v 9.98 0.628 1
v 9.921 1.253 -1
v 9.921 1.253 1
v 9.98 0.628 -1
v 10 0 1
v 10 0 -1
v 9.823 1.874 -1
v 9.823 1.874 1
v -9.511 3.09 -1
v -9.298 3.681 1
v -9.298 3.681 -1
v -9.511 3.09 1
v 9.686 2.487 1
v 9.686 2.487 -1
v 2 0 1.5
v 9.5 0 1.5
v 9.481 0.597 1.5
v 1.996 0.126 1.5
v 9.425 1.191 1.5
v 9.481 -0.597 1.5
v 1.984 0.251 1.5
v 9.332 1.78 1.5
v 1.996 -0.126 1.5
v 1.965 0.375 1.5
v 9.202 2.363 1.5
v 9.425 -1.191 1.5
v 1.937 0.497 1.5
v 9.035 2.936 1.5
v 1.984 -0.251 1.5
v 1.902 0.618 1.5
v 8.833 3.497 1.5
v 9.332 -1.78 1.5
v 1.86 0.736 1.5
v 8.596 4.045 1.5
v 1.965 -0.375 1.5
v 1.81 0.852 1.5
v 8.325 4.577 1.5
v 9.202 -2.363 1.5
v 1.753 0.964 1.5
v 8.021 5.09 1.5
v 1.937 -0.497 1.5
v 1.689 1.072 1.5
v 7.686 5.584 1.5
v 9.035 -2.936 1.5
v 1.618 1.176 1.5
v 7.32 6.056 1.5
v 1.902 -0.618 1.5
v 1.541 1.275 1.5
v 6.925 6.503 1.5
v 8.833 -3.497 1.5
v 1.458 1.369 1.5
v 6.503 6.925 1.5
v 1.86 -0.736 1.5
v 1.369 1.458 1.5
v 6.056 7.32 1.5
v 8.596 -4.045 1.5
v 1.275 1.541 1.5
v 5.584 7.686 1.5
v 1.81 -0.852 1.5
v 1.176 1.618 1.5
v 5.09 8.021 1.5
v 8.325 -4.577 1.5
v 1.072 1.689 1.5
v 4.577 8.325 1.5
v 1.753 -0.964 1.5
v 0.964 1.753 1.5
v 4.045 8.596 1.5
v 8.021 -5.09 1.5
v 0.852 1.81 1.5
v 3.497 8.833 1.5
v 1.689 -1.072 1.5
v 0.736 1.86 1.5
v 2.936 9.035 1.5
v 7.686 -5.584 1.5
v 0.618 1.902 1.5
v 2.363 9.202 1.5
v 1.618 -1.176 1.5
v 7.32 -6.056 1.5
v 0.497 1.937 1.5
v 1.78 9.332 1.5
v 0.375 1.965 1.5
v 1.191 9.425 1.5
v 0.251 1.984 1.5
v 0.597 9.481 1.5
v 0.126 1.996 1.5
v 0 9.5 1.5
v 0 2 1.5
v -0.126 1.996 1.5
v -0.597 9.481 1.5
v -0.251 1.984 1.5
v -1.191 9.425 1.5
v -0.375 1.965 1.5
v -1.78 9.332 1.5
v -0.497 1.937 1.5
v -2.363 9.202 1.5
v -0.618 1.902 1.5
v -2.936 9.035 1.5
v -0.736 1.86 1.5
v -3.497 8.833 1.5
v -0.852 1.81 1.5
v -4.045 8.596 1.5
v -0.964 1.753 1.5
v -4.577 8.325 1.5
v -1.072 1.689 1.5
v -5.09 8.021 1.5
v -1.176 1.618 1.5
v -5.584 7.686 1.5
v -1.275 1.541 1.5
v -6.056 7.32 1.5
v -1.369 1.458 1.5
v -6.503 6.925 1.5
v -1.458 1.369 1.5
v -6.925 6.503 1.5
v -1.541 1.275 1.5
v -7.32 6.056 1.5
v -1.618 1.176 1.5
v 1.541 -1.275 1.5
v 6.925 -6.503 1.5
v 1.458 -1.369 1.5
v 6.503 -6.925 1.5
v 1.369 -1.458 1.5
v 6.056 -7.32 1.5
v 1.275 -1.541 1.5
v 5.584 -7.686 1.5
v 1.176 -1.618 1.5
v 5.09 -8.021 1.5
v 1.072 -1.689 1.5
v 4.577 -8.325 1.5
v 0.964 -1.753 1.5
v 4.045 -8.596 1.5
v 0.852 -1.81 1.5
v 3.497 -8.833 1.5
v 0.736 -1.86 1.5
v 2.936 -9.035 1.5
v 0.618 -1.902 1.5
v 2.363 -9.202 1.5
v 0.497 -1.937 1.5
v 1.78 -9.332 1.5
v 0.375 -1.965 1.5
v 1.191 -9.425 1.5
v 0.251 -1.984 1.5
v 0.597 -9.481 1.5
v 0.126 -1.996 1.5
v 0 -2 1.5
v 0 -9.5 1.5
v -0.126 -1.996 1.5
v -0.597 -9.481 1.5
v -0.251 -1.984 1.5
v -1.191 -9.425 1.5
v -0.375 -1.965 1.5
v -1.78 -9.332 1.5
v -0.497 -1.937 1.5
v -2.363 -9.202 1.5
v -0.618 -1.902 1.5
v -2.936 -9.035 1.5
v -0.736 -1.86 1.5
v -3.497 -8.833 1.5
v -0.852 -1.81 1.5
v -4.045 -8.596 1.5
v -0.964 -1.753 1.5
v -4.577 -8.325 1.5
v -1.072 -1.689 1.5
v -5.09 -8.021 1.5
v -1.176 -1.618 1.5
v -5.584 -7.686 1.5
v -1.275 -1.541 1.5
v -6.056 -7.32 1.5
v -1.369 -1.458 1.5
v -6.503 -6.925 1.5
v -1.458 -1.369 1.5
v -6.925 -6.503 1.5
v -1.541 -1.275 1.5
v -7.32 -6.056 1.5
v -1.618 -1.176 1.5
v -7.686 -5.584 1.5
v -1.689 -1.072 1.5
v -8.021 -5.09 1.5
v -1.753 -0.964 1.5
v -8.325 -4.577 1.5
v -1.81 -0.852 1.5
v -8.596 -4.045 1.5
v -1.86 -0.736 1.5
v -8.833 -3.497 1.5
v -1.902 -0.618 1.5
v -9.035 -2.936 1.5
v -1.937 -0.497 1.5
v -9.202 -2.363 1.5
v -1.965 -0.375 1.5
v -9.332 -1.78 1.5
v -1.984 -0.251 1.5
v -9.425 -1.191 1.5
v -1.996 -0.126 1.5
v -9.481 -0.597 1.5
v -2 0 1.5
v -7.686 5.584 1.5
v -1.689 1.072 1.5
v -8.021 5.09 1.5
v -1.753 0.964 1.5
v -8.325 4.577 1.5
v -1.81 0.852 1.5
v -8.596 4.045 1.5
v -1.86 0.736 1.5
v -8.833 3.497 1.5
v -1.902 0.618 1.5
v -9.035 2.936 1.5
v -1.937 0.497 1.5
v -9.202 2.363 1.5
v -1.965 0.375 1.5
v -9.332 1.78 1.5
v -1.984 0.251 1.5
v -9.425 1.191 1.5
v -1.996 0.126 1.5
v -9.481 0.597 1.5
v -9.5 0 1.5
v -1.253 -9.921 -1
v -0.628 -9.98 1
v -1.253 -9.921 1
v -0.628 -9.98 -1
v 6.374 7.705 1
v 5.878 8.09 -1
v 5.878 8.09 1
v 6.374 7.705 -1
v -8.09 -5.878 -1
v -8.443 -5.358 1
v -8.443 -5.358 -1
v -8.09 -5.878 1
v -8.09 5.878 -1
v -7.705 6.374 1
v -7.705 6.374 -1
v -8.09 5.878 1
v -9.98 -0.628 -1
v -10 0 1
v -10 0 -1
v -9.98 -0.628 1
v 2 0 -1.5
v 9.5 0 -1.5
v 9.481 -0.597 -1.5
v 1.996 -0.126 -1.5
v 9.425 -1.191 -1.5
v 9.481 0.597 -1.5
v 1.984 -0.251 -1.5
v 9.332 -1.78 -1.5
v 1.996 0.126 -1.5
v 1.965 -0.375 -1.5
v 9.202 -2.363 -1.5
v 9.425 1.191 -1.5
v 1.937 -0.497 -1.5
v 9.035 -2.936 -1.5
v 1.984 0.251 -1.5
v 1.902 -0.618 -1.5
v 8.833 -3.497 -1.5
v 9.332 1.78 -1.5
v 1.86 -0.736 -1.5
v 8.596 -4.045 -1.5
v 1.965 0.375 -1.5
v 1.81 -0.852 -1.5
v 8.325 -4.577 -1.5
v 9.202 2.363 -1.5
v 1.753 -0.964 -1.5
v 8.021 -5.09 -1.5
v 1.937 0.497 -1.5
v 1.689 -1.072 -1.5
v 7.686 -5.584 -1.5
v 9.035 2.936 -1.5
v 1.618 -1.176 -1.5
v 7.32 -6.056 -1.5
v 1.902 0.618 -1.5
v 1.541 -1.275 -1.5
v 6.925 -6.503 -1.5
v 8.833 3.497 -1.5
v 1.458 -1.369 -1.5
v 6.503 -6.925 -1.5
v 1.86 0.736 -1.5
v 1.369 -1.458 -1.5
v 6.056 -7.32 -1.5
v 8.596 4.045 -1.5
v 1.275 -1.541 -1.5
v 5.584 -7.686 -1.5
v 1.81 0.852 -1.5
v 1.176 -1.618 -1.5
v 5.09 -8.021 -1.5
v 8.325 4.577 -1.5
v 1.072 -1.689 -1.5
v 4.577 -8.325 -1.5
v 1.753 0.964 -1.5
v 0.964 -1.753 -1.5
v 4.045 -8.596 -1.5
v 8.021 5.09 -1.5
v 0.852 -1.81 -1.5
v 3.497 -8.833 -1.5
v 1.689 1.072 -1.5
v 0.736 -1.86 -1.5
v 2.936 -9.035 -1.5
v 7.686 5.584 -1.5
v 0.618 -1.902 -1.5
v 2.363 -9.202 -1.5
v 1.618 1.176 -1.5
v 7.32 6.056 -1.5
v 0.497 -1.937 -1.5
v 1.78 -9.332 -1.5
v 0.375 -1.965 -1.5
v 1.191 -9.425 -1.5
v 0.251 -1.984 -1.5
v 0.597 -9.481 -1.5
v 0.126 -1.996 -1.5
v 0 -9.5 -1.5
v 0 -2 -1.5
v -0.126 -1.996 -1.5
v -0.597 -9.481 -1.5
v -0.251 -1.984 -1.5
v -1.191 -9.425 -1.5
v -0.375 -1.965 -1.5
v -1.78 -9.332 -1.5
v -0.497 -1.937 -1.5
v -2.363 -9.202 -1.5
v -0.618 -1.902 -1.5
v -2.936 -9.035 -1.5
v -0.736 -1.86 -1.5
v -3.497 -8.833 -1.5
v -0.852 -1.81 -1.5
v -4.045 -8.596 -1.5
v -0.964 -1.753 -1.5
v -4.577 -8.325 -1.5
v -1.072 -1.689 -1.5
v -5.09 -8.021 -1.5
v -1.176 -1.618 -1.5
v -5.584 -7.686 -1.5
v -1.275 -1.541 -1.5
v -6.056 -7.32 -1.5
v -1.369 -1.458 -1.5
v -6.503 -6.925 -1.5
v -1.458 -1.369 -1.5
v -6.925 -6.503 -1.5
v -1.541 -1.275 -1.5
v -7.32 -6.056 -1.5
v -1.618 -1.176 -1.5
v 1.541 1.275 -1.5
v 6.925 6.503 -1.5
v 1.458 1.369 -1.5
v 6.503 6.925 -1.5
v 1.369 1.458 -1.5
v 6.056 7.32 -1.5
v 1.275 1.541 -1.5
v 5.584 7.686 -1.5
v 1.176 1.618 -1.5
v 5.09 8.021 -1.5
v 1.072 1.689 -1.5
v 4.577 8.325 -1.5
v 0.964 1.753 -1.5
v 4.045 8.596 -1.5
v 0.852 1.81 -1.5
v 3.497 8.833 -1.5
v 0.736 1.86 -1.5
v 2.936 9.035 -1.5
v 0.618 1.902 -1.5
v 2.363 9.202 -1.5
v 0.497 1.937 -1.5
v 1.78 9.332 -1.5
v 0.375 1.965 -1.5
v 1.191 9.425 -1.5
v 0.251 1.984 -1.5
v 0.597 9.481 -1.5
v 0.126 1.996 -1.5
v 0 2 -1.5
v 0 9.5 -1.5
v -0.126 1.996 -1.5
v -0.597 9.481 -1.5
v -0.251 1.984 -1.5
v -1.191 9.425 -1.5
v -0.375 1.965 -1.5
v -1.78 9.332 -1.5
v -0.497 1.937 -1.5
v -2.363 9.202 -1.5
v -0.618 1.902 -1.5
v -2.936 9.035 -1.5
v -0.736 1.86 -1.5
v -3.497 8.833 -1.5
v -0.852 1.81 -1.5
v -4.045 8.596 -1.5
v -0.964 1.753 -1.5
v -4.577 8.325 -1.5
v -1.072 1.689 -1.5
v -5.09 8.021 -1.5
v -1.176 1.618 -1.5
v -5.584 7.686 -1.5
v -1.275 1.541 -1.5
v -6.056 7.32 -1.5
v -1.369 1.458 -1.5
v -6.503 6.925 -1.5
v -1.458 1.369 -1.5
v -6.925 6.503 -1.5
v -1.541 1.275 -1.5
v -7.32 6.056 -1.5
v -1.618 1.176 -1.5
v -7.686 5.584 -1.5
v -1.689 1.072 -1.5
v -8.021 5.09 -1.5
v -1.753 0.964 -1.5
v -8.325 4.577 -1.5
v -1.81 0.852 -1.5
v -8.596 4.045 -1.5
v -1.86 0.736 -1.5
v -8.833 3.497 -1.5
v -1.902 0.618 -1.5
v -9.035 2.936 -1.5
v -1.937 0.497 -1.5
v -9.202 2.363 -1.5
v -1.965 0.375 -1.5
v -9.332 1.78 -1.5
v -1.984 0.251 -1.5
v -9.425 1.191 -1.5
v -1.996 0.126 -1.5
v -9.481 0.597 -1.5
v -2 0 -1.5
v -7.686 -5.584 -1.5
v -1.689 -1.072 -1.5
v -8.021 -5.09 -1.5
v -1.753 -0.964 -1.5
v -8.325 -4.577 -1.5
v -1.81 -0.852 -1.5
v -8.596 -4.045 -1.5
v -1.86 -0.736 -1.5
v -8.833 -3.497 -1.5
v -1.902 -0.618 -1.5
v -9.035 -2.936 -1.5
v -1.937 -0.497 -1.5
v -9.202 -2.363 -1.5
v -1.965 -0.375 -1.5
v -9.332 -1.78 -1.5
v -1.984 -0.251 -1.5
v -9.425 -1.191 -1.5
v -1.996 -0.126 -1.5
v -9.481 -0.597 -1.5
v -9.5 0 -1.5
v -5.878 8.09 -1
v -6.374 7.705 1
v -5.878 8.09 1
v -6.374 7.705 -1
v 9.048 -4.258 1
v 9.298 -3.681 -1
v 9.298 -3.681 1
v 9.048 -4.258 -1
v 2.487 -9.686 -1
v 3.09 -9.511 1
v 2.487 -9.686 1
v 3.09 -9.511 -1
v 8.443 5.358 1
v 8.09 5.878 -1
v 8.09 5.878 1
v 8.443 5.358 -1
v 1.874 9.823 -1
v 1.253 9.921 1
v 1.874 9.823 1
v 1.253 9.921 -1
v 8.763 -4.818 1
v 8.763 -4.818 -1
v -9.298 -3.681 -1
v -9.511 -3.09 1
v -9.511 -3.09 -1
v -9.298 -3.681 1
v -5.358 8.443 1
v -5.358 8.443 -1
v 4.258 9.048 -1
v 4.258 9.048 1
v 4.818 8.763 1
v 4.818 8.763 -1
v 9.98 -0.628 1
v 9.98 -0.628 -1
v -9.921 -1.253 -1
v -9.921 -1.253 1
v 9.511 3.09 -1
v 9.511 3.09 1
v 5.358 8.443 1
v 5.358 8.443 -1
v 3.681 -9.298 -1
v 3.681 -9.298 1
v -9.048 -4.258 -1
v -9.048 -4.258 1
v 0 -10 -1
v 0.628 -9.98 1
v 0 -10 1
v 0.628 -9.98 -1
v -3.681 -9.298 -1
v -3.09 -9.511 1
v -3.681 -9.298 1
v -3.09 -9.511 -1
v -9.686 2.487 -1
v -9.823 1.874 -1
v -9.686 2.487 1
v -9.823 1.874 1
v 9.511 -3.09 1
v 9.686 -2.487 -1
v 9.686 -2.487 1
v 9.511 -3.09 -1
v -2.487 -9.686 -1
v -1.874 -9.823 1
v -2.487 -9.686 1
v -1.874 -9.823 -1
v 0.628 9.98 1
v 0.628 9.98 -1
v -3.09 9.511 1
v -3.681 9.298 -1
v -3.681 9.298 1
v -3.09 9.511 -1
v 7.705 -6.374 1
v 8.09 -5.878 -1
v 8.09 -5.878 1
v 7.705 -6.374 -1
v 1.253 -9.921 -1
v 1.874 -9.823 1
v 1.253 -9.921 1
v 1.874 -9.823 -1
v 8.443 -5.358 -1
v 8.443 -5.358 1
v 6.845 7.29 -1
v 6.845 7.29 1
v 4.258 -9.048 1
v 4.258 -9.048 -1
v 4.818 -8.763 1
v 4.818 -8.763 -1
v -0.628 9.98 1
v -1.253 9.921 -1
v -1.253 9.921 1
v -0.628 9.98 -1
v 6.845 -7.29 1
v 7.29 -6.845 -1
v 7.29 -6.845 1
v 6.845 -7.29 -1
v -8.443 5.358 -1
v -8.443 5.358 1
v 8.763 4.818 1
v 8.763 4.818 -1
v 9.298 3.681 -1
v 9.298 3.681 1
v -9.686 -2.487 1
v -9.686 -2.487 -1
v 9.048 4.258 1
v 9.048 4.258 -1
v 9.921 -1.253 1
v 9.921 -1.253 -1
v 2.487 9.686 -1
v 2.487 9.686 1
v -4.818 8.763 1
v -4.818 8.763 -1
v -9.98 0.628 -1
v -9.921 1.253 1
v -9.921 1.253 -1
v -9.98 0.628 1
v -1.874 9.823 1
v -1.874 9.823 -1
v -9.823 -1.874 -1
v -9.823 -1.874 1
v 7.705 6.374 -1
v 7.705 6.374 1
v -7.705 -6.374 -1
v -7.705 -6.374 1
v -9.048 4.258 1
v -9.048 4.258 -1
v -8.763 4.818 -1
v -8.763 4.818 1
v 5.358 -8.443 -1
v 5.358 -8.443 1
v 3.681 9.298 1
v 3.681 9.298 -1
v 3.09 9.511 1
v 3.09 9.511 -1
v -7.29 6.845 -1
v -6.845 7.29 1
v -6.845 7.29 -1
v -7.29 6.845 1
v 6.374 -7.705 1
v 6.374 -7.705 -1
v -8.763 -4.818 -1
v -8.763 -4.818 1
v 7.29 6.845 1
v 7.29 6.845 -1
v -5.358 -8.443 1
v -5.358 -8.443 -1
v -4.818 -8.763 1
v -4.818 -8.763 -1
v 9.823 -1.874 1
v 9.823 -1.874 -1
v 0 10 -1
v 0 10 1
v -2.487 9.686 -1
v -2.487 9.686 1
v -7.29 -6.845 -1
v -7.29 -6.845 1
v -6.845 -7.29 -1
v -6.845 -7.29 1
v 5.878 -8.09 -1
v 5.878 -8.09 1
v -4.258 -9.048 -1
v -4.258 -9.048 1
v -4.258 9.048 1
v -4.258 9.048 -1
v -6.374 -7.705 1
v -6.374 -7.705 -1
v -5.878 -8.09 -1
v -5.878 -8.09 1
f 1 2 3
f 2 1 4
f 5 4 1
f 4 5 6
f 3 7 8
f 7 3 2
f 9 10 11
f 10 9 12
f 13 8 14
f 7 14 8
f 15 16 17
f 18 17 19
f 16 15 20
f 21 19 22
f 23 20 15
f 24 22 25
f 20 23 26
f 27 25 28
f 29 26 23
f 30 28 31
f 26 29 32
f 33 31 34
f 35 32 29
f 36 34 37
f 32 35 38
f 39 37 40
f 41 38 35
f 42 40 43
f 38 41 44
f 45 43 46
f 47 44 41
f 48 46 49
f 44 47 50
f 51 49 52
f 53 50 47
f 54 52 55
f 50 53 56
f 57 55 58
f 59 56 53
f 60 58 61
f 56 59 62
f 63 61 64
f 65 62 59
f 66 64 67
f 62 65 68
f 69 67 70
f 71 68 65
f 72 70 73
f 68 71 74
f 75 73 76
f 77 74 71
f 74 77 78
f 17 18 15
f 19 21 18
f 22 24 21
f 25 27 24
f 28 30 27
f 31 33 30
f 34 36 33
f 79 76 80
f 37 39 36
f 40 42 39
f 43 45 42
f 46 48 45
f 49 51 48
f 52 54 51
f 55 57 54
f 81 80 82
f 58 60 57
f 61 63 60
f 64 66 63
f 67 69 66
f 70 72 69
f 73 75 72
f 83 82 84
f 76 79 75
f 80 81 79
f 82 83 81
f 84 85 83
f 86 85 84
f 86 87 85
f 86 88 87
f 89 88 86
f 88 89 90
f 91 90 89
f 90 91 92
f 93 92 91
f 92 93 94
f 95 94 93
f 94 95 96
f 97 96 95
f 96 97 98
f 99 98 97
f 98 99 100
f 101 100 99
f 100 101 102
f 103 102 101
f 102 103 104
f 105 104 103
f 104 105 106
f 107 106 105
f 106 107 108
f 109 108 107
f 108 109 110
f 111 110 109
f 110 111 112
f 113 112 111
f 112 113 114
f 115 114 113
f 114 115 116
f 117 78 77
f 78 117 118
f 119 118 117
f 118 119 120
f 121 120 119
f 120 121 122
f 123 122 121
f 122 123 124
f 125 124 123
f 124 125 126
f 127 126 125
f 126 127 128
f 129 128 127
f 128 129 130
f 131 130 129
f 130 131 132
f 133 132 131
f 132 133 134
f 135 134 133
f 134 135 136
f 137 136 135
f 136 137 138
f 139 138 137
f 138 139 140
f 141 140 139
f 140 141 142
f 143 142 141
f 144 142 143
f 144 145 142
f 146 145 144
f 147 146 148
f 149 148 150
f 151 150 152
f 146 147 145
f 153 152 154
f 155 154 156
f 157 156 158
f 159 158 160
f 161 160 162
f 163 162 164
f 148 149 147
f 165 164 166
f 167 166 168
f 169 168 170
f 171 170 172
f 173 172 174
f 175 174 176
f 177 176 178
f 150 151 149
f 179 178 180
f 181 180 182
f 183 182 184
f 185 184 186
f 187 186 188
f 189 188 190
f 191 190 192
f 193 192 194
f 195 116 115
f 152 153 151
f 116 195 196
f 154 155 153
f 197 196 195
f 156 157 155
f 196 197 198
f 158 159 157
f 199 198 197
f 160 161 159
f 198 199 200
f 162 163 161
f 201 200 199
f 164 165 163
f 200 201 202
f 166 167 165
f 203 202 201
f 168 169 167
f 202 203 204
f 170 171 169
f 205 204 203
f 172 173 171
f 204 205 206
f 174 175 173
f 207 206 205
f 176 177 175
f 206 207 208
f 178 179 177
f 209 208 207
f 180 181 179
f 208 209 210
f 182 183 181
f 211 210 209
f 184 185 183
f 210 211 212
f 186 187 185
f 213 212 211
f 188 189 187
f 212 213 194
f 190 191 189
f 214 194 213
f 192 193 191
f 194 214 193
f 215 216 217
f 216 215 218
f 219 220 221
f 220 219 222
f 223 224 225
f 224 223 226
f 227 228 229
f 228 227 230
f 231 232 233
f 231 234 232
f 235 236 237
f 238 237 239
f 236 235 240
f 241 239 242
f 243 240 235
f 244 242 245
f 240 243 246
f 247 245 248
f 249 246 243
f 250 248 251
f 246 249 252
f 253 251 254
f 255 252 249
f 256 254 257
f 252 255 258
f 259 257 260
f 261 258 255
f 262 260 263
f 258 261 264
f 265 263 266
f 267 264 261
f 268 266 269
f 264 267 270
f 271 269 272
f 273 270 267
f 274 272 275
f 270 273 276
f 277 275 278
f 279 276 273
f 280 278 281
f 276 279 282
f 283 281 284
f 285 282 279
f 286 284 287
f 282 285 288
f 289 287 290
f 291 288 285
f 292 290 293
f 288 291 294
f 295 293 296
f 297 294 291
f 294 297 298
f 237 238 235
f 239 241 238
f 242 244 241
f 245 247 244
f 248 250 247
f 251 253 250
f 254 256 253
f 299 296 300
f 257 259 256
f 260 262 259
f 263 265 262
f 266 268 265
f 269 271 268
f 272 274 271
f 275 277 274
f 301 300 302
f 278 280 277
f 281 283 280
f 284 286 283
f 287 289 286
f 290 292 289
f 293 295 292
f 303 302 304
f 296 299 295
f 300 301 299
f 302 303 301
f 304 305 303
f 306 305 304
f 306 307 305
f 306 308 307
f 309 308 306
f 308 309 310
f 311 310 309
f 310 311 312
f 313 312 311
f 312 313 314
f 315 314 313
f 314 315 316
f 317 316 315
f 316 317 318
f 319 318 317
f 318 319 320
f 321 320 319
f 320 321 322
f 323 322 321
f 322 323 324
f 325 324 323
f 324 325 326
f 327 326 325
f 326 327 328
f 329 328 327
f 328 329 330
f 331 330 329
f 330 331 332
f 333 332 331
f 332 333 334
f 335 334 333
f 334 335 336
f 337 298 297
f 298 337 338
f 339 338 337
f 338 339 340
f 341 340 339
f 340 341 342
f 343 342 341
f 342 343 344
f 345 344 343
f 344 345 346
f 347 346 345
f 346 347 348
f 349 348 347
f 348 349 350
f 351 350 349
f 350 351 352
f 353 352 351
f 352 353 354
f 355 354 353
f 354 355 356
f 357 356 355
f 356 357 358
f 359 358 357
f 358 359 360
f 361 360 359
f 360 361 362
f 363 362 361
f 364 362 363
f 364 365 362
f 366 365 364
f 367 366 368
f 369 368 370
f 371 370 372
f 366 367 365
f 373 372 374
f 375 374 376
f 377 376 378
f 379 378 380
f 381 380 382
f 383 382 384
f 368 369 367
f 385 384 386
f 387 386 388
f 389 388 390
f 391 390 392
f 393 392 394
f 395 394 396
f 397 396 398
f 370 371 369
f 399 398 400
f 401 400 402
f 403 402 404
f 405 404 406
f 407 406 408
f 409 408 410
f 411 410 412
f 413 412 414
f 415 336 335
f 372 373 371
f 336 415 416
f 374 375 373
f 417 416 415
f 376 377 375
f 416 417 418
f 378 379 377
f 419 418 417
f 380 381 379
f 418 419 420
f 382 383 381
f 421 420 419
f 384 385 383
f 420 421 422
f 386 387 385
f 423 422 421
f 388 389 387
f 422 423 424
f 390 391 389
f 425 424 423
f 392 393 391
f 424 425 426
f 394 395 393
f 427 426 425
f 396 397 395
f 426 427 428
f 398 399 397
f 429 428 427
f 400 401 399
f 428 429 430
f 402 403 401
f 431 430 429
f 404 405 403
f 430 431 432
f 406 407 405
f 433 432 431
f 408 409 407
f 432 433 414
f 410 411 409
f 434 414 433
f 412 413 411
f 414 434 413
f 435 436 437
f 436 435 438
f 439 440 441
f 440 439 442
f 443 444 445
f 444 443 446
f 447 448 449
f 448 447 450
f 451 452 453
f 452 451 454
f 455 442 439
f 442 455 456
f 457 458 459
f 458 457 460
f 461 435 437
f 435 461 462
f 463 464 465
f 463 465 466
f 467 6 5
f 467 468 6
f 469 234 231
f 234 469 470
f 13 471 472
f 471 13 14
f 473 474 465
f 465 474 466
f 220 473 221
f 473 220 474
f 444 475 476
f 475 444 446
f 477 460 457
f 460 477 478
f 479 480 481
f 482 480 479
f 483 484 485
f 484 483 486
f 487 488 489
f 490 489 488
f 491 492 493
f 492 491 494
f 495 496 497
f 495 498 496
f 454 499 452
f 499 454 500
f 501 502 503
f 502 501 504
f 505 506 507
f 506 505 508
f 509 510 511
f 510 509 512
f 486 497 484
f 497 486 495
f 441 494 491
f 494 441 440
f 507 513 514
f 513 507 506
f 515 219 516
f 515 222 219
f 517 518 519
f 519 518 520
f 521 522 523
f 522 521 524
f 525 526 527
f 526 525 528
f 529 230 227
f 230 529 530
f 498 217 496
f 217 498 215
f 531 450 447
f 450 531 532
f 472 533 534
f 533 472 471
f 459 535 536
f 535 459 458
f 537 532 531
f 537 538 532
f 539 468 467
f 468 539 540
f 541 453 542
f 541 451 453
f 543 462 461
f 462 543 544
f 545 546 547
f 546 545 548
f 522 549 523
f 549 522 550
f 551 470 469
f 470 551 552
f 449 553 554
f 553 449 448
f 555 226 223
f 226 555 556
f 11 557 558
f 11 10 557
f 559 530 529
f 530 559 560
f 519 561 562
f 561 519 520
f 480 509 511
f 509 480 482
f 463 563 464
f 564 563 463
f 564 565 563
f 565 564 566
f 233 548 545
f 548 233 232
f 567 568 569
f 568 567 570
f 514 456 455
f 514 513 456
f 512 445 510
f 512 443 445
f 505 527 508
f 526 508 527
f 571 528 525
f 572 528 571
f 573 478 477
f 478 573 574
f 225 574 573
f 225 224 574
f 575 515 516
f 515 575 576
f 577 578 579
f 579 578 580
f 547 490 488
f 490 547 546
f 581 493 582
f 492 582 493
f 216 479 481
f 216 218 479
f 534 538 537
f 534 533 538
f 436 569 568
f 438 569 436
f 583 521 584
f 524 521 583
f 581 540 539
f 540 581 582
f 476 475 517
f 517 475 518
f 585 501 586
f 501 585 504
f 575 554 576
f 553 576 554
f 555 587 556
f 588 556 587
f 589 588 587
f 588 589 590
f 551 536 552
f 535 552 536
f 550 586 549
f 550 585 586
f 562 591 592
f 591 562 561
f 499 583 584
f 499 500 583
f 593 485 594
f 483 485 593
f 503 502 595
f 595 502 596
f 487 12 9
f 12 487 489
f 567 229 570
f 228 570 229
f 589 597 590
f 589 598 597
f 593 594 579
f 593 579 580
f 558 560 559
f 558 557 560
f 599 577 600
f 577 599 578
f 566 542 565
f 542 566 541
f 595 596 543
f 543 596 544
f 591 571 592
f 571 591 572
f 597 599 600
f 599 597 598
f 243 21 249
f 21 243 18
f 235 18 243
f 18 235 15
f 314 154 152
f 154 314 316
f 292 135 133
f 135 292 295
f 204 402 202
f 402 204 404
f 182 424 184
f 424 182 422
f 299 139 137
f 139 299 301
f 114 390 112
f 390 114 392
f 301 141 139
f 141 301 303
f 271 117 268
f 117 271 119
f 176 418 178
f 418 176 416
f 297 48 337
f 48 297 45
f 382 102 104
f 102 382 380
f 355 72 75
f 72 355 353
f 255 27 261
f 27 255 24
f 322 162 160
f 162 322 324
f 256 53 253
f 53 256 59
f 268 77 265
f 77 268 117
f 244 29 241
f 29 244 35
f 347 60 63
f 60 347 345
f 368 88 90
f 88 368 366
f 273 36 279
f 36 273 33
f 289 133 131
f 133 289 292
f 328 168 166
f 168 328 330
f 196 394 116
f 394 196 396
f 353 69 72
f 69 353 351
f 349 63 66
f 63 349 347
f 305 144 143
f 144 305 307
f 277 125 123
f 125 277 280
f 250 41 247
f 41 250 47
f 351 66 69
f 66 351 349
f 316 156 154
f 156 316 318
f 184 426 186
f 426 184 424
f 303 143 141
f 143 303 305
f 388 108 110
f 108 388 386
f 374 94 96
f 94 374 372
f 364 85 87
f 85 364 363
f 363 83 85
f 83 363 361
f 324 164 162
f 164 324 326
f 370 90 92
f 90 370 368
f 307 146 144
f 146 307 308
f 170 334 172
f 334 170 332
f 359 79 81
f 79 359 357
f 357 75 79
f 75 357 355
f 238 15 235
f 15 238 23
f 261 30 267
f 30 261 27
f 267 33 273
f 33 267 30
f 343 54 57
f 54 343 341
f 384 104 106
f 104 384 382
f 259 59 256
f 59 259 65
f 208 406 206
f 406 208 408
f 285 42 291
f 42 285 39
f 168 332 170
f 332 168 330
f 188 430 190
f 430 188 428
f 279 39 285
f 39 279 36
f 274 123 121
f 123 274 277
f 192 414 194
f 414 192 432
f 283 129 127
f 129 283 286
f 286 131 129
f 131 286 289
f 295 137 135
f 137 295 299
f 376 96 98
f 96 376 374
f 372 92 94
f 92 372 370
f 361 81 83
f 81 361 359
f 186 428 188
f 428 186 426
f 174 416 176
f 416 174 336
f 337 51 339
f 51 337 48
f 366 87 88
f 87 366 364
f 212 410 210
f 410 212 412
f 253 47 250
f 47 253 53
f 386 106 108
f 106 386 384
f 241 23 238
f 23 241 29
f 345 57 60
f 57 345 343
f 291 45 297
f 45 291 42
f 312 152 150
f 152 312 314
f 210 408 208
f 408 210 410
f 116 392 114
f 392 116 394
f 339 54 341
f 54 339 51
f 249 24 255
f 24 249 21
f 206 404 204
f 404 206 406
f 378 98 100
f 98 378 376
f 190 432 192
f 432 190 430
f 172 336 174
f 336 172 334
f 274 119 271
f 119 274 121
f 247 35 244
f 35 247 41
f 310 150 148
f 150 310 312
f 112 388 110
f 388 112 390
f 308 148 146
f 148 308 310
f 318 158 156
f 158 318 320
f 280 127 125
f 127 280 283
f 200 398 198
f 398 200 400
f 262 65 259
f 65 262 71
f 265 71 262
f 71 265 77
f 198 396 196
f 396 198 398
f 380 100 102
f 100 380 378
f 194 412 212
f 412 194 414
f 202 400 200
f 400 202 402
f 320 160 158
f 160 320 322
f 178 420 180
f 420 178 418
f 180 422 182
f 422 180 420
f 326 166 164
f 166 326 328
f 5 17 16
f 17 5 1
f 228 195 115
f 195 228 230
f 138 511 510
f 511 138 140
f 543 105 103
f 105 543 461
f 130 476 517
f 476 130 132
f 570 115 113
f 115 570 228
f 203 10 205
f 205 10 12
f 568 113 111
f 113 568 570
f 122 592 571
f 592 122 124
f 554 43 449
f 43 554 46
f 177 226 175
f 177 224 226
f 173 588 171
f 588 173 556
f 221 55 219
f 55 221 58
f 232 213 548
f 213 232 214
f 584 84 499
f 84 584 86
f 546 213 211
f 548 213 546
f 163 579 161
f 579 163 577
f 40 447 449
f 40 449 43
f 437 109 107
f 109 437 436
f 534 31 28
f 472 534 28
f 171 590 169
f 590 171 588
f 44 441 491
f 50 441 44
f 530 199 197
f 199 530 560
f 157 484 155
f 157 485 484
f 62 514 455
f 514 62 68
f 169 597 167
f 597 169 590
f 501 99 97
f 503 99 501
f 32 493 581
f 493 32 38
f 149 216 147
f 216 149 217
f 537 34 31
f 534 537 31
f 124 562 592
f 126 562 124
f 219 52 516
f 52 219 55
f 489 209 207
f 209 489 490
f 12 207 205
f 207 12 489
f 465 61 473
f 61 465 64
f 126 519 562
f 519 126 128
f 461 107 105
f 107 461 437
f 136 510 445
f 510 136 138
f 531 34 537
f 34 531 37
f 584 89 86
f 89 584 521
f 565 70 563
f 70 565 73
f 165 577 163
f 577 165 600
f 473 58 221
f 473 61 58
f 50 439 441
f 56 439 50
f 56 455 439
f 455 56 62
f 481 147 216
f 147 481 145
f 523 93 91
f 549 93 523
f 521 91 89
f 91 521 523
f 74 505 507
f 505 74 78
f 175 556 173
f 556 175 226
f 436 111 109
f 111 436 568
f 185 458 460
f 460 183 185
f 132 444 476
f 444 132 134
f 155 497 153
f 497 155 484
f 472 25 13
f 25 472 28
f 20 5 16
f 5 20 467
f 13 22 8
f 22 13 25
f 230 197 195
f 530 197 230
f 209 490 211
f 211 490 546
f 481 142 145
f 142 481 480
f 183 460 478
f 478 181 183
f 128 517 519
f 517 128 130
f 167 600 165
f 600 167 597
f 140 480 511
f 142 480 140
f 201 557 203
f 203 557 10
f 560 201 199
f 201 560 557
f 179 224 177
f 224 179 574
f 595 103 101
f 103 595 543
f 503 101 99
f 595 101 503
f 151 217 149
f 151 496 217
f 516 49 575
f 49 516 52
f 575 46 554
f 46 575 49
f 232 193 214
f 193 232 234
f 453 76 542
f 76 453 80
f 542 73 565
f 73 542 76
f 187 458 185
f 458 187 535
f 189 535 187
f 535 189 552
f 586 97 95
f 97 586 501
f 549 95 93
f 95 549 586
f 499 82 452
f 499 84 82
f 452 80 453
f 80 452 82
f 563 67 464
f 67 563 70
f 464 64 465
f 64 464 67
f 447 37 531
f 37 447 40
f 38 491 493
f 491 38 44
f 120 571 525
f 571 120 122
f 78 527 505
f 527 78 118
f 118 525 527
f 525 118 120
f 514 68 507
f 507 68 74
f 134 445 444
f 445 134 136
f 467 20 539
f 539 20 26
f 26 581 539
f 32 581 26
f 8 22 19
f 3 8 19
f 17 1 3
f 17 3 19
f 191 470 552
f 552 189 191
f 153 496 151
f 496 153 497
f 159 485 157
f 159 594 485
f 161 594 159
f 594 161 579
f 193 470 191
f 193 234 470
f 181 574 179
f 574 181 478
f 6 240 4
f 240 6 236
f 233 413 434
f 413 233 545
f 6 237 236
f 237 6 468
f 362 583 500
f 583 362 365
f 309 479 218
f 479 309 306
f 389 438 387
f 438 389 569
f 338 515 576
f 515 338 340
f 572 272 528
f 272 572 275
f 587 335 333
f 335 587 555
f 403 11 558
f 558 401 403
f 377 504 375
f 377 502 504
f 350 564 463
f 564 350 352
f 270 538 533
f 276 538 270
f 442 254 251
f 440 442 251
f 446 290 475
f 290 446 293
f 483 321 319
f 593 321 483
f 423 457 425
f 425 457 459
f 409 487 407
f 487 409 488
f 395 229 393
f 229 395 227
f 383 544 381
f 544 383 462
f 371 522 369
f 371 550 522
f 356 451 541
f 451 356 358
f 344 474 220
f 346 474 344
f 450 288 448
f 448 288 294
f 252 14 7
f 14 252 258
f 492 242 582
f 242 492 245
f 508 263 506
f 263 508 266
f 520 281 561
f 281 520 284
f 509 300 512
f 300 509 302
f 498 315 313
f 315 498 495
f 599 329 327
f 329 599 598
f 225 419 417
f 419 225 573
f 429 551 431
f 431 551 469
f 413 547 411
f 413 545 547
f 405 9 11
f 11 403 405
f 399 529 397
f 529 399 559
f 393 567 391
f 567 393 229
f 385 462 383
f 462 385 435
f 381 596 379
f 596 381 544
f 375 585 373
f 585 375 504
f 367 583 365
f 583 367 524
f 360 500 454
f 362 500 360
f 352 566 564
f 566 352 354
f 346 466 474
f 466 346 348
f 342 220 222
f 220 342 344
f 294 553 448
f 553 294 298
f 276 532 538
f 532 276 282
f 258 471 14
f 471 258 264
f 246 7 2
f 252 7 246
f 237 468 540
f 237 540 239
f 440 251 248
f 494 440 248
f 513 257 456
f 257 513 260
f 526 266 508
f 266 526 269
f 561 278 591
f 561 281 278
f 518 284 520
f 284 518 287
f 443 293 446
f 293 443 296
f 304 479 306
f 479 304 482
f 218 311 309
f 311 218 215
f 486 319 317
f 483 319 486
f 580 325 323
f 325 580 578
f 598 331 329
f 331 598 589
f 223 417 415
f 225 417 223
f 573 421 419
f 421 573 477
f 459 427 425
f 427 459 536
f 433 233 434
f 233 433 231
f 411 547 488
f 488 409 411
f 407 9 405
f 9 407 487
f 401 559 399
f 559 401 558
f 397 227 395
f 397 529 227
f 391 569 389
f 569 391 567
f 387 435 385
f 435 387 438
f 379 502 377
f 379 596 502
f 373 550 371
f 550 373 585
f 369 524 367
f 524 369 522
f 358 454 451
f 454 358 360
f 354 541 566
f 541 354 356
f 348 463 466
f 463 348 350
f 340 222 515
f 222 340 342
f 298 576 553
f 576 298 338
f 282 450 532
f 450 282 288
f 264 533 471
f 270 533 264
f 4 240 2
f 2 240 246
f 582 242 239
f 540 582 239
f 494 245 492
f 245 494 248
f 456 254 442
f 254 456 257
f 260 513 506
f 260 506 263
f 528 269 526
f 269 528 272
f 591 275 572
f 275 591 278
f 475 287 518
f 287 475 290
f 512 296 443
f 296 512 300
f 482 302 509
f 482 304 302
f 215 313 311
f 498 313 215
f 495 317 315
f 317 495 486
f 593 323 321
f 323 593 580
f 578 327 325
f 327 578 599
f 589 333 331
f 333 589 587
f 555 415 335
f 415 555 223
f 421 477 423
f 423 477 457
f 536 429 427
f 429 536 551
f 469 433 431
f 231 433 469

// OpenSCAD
intersection(){
    difference(){
        // washer body
        cylinder(r1=10, r2=10, h=3, $fn=100, center=true);
        // center hole
        cylinder(r1=2, r2=2, h=5, $fn=100, center=true);
    }
    // upper chamfer
    translate([0, 0, 3.5]) cylinder(r1=15, r2=0, h=15, $fn=100, center=true);
    // lower chamfer
    translate([0, 0, -3.5]) cylinder(r1=0, r2=15, h=15, $fn=100, center=true);
}
